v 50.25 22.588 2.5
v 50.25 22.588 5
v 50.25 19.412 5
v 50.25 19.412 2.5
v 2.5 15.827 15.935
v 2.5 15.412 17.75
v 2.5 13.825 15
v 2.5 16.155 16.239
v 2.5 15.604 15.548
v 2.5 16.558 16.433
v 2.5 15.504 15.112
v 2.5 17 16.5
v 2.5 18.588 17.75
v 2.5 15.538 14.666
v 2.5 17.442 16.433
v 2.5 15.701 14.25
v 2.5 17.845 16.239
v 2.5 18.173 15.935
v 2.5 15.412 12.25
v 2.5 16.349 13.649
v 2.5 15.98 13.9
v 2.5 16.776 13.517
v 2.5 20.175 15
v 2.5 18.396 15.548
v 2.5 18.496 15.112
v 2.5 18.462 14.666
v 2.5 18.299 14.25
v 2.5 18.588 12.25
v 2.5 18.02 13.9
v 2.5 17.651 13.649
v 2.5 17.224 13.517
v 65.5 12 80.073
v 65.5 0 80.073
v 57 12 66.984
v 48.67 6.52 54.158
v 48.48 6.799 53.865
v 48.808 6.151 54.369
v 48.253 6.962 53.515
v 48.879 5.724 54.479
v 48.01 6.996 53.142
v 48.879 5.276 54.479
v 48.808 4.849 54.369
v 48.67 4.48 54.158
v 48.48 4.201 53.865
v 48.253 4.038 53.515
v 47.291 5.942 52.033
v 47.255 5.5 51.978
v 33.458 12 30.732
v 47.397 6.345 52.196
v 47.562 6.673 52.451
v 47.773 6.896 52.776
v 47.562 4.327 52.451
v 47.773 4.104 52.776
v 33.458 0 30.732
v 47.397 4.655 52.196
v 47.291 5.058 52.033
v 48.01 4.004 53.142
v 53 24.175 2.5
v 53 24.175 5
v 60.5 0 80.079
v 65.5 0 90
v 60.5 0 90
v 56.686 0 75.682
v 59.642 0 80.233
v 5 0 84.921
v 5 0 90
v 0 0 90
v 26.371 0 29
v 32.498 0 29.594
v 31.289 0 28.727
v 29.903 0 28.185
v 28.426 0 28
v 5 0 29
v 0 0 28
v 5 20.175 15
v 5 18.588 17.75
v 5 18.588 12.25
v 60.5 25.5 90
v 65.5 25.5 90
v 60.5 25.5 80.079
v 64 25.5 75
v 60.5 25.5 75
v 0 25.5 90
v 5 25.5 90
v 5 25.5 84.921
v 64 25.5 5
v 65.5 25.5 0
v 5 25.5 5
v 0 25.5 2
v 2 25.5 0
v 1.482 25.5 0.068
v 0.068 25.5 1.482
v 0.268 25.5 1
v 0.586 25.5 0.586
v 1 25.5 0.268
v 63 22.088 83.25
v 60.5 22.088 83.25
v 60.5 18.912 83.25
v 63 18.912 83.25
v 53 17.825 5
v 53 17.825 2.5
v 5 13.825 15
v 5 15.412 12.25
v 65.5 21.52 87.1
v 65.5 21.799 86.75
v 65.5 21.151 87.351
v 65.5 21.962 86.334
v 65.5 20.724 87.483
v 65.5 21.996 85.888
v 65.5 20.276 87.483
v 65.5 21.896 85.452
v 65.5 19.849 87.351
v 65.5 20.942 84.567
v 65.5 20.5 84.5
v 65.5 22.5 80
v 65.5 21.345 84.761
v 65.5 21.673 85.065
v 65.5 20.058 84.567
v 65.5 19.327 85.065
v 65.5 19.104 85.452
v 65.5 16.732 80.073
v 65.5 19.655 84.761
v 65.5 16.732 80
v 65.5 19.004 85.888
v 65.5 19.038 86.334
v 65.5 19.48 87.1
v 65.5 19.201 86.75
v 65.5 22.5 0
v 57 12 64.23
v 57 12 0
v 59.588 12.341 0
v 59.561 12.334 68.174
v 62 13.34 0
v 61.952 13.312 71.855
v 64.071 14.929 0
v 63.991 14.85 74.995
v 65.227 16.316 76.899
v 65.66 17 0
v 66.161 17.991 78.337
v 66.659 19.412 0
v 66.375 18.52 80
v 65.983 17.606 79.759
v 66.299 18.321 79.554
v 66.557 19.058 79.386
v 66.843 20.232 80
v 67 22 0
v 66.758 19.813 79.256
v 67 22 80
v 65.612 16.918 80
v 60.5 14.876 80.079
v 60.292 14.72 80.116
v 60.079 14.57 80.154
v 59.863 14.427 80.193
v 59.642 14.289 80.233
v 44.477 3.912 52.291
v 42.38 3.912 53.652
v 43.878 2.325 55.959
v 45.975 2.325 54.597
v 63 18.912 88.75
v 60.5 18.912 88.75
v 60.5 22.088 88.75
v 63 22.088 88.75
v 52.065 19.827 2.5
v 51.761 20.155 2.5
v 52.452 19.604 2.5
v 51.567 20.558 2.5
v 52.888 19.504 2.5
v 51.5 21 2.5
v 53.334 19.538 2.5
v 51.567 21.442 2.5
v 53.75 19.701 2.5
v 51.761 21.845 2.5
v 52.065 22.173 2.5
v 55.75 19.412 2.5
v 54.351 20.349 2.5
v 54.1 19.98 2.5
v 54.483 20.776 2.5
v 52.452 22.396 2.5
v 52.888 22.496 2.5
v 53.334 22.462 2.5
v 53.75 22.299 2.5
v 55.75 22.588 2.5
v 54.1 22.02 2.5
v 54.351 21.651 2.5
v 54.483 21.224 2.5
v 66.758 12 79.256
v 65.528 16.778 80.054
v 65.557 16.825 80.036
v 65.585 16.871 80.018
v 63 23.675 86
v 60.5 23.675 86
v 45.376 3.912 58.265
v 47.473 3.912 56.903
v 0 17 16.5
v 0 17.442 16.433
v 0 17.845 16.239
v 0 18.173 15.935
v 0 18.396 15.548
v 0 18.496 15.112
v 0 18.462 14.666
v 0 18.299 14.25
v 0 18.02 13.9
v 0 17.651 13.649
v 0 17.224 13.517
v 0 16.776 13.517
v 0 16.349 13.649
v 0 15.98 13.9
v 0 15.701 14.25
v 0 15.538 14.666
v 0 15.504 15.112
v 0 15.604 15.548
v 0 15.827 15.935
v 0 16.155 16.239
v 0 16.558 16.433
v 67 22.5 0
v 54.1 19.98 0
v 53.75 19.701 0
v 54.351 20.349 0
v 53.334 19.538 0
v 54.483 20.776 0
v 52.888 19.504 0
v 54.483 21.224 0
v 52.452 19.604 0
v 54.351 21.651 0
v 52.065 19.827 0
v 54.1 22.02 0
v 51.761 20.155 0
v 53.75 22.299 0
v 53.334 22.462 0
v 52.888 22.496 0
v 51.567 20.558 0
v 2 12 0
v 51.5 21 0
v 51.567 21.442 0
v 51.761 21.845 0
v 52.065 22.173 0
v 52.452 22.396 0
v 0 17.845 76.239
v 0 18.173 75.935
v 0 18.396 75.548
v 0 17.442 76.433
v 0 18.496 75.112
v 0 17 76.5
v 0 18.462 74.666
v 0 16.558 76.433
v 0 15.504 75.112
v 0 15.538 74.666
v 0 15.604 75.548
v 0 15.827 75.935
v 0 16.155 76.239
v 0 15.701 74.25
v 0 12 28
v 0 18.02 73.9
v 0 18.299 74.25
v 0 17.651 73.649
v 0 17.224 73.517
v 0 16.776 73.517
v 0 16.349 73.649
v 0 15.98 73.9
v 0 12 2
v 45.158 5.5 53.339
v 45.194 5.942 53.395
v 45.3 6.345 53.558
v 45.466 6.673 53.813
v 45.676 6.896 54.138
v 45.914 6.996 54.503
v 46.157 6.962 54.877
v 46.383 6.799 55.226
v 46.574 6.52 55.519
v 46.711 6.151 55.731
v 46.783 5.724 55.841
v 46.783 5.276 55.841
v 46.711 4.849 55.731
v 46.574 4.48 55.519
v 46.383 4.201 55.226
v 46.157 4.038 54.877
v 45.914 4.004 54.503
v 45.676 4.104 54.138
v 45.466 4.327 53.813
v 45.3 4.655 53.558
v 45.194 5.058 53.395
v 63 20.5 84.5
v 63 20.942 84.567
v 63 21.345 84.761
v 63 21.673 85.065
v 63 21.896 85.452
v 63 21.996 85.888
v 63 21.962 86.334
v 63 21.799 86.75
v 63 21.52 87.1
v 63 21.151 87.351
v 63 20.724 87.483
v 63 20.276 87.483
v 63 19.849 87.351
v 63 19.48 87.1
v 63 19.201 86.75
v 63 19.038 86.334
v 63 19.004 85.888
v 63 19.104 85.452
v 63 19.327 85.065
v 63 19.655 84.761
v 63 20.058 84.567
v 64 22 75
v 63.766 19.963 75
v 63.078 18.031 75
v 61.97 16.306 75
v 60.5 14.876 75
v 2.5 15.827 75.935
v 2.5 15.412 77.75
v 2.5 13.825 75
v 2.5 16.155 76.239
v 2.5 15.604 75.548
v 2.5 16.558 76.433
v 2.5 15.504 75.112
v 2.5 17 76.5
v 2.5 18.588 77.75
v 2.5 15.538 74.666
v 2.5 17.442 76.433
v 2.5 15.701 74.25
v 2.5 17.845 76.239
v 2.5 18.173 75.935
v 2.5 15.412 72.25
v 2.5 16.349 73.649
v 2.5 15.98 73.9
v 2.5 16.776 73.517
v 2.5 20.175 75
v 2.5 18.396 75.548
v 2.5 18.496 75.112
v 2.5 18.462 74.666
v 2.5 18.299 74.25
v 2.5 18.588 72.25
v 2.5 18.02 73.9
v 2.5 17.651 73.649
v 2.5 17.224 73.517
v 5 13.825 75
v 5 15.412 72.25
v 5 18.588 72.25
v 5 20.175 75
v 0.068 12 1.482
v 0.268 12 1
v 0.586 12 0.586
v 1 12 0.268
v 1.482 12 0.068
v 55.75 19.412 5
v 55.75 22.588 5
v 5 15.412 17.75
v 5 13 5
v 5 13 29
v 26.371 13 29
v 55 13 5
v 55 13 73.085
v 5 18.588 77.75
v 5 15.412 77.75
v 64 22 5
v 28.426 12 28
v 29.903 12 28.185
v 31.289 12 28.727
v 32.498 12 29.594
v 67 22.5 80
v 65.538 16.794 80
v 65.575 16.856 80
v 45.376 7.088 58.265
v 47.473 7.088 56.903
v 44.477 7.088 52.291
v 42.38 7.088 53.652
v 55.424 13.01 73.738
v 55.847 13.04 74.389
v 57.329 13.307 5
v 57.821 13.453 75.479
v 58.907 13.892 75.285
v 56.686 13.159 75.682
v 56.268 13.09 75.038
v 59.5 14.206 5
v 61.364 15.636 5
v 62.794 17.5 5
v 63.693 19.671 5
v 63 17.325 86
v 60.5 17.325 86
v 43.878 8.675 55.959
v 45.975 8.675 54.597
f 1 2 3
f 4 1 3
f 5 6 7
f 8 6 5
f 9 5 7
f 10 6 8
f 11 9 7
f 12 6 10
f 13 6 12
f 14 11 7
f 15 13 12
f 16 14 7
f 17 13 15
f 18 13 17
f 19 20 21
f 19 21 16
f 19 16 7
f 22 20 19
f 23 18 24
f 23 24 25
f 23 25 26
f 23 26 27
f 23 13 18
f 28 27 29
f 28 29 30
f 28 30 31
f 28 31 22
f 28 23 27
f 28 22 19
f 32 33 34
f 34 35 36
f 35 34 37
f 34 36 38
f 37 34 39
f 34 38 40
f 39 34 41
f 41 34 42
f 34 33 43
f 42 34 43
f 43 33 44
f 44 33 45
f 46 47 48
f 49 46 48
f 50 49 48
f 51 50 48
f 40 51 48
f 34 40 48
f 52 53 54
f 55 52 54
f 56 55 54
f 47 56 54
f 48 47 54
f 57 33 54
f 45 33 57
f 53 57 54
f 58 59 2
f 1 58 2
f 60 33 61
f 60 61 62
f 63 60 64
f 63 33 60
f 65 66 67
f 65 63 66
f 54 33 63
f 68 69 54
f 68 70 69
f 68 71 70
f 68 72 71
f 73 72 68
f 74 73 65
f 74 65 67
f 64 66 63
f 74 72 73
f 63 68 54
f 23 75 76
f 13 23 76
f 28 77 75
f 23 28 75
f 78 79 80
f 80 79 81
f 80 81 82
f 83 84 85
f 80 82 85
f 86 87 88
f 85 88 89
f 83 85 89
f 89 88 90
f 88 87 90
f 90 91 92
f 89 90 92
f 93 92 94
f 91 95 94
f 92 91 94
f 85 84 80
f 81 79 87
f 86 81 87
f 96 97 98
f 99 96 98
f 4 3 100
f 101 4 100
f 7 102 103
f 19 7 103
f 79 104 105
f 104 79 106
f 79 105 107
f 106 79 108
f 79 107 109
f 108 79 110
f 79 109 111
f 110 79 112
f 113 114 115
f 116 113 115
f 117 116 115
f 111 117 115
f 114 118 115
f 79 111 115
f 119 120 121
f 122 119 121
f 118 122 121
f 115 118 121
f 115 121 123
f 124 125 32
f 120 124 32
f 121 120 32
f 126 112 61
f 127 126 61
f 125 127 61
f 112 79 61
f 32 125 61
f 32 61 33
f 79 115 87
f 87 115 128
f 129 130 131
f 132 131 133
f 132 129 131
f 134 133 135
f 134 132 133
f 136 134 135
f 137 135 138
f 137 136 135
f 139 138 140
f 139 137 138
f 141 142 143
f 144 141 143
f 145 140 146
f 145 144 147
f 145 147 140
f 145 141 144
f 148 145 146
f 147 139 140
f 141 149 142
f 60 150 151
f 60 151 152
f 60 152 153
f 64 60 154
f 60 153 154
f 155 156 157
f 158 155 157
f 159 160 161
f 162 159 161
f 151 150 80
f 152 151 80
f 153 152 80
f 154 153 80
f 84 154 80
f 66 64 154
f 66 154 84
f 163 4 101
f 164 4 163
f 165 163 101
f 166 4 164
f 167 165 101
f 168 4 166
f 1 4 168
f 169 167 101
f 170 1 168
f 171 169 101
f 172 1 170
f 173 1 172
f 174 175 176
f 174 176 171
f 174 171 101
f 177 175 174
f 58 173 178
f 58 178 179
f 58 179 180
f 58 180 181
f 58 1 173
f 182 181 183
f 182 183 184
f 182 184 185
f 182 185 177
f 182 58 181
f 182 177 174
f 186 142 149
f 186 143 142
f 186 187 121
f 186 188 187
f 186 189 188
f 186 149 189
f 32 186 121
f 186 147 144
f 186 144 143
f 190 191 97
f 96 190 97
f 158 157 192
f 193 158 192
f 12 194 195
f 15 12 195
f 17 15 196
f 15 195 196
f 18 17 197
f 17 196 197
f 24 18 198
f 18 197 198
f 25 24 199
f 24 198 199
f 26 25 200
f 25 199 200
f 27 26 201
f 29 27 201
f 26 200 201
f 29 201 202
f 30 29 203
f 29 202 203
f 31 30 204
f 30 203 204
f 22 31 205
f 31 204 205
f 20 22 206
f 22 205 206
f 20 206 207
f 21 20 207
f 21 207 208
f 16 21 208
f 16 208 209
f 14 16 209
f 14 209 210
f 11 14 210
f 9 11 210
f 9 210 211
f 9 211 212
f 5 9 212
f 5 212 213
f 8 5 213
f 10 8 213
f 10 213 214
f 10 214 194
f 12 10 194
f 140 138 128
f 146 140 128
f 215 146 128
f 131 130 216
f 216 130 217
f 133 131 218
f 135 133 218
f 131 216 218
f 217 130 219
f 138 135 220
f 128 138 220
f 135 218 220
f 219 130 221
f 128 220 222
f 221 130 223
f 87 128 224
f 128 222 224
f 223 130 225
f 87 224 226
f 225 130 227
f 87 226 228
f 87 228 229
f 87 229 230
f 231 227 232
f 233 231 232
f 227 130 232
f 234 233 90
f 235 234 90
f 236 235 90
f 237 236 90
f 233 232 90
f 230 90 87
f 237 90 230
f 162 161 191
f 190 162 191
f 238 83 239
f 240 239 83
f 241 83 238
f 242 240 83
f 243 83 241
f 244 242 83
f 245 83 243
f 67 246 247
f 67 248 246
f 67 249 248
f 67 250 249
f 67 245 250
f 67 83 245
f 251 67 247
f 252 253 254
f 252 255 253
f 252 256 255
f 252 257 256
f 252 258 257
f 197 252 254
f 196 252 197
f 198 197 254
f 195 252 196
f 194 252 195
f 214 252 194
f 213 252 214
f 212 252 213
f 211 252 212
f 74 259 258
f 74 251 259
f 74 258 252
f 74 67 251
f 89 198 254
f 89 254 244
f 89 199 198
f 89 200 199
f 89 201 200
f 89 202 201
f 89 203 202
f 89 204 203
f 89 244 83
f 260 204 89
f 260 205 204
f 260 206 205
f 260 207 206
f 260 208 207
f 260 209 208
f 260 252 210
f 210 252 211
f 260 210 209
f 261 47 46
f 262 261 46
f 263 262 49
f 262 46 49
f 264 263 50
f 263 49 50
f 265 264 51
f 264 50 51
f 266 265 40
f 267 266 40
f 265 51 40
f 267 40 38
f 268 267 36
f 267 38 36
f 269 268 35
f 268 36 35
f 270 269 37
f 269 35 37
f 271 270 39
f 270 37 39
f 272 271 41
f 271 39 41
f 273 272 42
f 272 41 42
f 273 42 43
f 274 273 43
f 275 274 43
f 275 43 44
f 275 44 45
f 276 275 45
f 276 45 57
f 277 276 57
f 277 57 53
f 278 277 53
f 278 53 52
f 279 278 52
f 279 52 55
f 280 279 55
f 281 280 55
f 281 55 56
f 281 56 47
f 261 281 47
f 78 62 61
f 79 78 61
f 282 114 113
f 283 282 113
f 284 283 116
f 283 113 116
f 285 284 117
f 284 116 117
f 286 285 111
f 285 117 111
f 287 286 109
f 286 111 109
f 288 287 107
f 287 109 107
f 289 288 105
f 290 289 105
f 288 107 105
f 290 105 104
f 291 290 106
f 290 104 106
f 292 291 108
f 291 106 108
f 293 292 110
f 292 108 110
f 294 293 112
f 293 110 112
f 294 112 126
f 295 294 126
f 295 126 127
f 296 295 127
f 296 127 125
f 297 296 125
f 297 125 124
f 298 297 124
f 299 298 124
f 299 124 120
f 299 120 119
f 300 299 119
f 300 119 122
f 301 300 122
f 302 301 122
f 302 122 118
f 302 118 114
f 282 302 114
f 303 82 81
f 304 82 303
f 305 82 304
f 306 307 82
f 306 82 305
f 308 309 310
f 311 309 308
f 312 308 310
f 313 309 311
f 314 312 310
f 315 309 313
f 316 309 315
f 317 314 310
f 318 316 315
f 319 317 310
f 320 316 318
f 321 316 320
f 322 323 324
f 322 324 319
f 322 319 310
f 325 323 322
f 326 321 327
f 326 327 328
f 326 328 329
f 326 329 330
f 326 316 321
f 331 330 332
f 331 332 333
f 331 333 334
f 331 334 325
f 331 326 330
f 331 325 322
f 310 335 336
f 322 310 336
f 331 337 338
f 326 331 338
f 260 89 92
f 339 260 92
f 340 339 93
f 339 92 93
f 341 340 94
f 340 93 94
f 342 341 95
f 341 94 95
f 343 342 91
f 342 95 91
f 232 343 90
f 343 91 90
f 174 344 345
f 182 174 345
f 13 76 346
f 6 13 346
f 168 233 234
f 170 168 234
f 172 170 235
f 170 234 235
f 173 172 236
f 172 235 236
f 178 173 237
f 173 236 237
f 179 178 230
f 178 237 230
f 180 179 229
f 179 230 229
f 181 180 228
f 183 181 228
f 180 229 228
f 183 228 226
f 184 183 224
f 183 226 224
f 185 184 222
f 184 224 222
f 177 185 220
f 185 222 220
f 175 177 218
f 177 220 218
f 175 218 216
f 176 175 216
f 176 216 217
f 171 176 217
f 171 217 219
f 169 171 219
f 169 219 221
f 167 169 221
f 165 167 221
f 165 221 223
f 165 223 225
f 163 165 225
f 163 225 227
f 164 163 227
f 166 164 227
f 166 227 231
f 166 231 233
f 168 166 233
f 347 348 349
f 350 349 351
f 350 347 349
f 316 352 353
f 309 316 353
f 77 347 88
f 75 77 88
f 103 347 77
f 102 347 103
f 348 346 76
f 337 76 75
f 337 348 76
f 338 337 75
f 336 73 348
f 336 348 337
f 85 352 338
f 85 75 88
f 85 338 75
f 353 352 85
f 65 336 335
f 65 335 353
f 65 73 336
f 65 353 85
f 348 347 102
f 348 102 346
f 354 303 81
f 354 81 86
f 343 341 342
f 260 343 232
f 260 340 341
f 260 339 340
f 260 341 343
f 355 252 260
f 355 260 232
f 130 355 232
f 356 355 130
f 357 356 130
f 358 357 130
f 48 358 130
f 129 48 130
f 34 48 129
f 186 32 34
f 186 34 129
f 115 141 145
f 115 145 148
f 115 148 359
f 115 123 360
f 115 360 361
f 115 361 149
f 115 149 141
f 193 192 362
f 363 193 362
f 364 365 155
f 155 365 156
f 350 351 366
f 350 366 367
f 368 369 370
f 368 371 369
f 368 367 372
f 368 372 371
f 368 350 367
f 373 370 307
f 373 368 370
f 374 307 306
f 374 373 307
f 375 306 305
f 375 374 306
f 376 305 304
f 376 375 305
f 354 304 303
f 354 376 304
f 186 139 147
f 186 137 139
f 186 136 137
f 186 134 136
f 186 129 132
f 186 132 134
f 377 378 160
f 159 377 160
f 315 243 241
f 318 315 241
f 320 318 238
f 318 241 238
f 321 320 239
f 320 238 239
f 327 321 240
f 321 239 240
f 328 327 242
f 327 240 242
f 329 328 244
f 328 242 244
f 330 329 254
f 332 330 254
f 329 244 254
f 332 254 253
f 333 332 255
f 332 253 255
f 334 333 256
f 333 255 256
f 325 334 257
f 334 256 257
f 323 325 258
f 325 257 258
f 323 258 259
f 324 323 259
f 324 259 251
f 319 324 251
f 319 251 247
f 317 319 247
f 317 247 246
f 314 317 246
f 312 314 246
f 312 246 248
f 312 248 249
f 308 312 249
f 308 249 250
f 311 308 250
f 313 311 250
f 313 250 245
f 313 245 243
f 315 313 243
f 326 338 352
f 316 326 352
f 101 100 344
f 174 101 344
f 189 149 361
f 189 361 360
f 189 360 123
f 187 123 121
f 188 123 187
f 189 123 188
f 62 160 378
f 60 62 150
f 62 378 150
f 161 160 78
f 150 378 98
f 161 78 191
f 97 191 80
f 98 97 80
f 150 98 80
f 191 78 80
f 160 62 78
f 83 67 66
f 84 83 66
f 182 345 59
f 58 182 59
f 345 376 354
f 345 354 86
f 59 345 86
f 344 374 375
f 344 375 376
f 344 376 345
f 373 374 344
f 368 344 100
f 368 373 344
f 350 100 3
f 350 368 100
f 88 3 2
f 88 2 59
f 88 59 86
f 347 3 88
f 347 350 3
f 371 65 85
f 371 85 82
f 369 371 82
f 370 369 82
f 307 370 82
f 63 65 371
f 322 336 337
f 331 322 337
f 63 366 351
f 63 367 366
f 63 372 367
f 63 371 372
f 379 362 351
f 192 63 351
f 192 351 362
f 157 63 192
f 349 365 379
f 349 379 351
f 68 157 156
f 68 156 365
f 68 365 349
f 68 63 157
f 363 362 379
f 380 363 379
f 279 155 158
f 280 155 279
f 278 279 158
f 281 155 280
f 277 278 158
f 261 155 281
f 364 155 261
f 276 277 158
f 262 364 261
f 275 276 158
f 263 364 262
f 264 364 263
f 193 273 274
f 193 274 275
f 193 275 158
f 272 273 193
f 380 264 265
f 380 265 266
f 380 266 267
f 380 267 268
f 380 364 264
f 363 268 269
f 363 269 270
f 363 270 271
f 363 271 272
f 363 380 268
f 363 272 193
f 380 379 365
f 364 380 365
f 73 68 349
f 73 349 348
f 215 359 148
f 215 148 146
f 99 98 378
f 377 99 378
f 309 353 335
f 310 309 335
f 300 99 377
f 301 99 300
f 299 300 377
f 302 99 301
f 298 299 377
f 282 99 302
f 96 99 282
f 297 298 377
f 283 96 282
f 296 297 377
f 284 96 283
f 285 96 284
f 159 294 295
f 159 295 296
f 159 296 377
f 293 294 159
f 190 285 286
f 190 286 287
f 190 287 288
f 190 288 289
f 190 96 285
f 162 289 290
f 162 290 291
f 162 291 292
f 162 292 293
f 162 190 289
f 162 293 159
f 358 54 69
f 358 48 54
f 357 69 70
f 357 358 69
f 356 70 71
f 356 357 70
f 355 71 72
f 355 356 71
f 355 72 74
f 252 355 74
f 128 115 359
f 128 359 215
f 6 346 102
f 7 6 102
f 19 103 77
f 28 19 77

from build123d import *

# Parameters (mm, degrees)
ESQUISSE1_W              = 65.5
ESQUISSE1_H              = 90
BOSS_EXTRU_1_DEPTH       = 25.5
CONG_2_R                 = 2
ESQUISSE6_W              = 80
ESQUISSE6_H              = 22.5
BOSS_EXTRU_2_DEPTH       = 1.5
ENL_V_MAT_EXTRU_5_DEPTH  = 12
COQUE1_DEPTH             = 25.5
COQUE1_START             = 13
COQUE1_2_DEPTH           = 12.5
COQUE1_3_OUTLINE_W       = 3.5
COQUE1_3_OUTLINE_H       = 70
COQUE1_3_DEPTH           = 4.5
ENL_V_MAT_EXTRU_12_DEPTH = 12.5
CONG_5_R                 = 9
CONG_4_R                 = 10
BOSS_EXTRU_3_REACH       = 115.01
BOSS_EXTRU_3_END_RADIUS  = 10
ESQUISSE5_R              = 1.5
ENL_V_MAT_EXTRU_4_DEPTH  = 8
CONG_3_R                 = 6
ESQUISSE11_R             = 1.5
ENL_V_MAT_EXTRU_7_DEPTH  = 7.5
ESQUISSE12_R             = 1.5
ENL_V_MAT_EXTRU_8_DEPTH  = 7.5
ENL_V_MAT_EXTRU_9_DEPTH  = 2.5
ENL_V_MAT_EXTRU_10_DEPTH = 2.5
ENL_V_MAT_EXTRU_11_DEPTH = 2.5
BOSS_EXTRU_7_START       = -25.5
BOSS_EXTRU_7_DEPTH       = 25.5
ENL_V_MAT_EXTRU_13_DEPTH = 116.061939841
ESQUISSE21_R             = 1.5
ENL_V_MAT_EXTRU_14_DEPTH = 7.5
ENL_V_MAT_EXTRU_15_DEPTH = 2.5


# Read off the part's stored shape, not the designer's step: Coque1
with BuildPart() as part:
    # Esquisse1 → Boss.-Extru.1 (new body)
    with BuildSketch(Plane(origin=(0, 0, 0), x_dir=(1, 0, 0), z_dir=(0, 1, 0))):
        with Locations((32.75, -45)):
            Rectangle(ESQUISSE1_W, ESQUISSE1_H)
    extrude(amount=BOSS_EXTRU_1_DEPTH)

    # Congé2
    cong_2_edges = [part.edges().sort_by_distance(p)[0] for p in [
        (0, 12.75, 0),
    ]]
    fillet(cong_2_edges, radius=CONG_2_R)

    # Esquisse6 → Boss.-Extru.2 (add)
    with BuildSketch(Plane(origin=(65.5, 0, 0), x_dir=(0, 0, -1), z_dir=(1, 0, 0))):
        with Locations((-40, 11.25)):
            Rectangle(ESQUISSE6_W, ESQUISSE6_H)
    extrude(amount=BOSS_EXTRU_2_DEPTH)

    # Esquisse8 → Enlèv. mat.-Extru.5 (cut)
    with BuildSketch(Plane.XZ):
        Polygon((0, 0), (67, 0), (67, 82.382775564), (31.68341261, 28), (0, 28), align=None)
    extrude(amount=-ENL_V_MAT_EXTRU_5_DEPTH, mode=Mode.SUBTRACT)

    # Coque1 outline → Coque1 (cut)
    with BuildSketch(Plane(origin=(0, 0, 0), x_dir=(1, 0, 0), z_dir=(0, 1, 0))):
        Polygon((60.5, -90), (60.5, -81.554045593), (26.371003739, -29), (5, -29), (5, -90), align=None)
    extrude(amount=COQUE1_DEPTH, mode=Mode.SUBTRACT)

    # Coque1 2 outline → Coque1 2 (cut)
    with BuildSketch(Plane(origin=(0, 0, 0), x_dir=(1, 0, 0), z_dir=(0, 1, 0)).offset(COQUE1_START)):
        Polygon((60.5, -81.554045593), (60.5, -5), (5, -5), (5, -29), (26.371003739, -29), align=None)
    extrude(amount=COQUE1_2_DEPTH, mode=Mode.SUBTRACT)

    # Coque1 3 outline → Coque1 3 (cut)
    with BuildSketch(Plane(origin=(0, 0, 0), x_dir=(1, 0, 0), z_dir=(0, 1, 0)).offset(COQUE1_START)):
        with Locations((62.25, -40)):
            Rectangle(COQUE1_3_OUTLINE_W, COQUE1_3_OUTLINE_H)
    extrude(amount=COQUE1_3_DEPTH, mode=Mode.SUBTRACT)

    # Esquisse17 → Enlèv. mat.-Extru.12 (cut)
    with BuildSketch(Plane(origin=(0, 13, 0), x_dir=(1, 0, 0), z_dir=(0, 1, 0))):
        Polygon((5, -5), (5, -29), (26.371003739, -29), (60.5, -81.554045593), (60.5, -75), (64, -75), (64, -5), align=None)
    extrude(amount=ENL_V_MAT_EXTRU_12_DEPTH, mode=Mode.SUBTRACT)

    # Congé5
    cong_5_edges = [part.edges().sort_by_distance(p)[0] for p in [
        (64, 13, 40),
    ]]
    fillet(cong_5_edges, radius=CONG_5_R)

    # Congé4
    cong_4_edges = [part.edges().sort_by_distance(p)[0] for p in [
        (67, 12, 40),
    ]]
    fillet(cong_4_edges, radius=CONG_4_R)

    # Boss.-Extru.3: up to this cylinder (the profile starts outside it)
    boss_extru_3_end = Plane(origin=(57, 22, 72.615279), z_dir=(0, 0, -1)) * Cylinder(BOSS_EXTRU_3_END_RADIUS, 251.02, mode=Mode.PRIVATE)
    # Esquisse9 → Boss.-Extru.3 (add, up to the surface)
    with BuildSketch(Plane.XZ.offset(-12), mode=Mode.PRIVATE) as boss_extru_3_sk1:
        Polygon((57, 66.984125926), (57, 64.230008238), (66.758005852, 79.256019566), (65.5, 80.072978118), align=None)
    boss_extru_3_tool1 = extrude(boss_extru_3_sk1.sketch, amount=-BOSS_EXTRU_3_REACH, mode=Mode.PRIVATE) - boss_extru_3_end
    add(boss_extru_3_tool1.solids().sort_by_distance((61.571725, 12, 72.615279))[0])

    # Esquisse5 → Enlèv. mat.-Extru.4 (cut)
    with BuildSketch(Plane.ZY):
        with Locations((15, 17)):
            Circle(ESQUISSE5_R)
        with Locations((75, 17)):
            Circle(ESQUISSE5_R)
    extrude(amount=-ENL_V_MAT_EXTRU_4_DEPTH, mode=Mode.SUBTRACT)

    # Congé3
    cong_3_edges = [part.edges().sort_by_distance(p)[0] for p in [
        (31.68341261, 6, 28),
    ]]
    fillet(cong_3_edges, radius=CONG_3_R)

    # Esquisse11 → Enlèv. mat.-Extru.7 (cut)
    with BuildSketch(Plane(origin=(9.495472341, 0, -6.166431839), x_dir=(-0.5446390350150254, 0, -0.8386705679454252), z_dir=(0.8386705679454252, 0, -0.5446390350150254))):
        with Locations((-70.828706829, 5.5)):
            Circle(ESQUISSE11_R)
    extrude(amount=-ENL_V_MAT_EXTRU_7_DEPTH, mode=Mode.SUBTRACT)

    # Esquisse12 → Enlèv. mat.-Extru.8 (cut)
    with BuildSketch(Plane(origin=(65.5, 0, 0), x_dir=(0, 0, -1), z_dir=(1, 0, 0))):
        with Locations((-86, 20.5)):
            Circle(ESQUISSE12_R)
    extrude(amount=-ENL_V_MAT_EXTRU_8_DEPTH, mode=Mode.SUBTRACT)

    # Esquisse13 → Enlèv. mat.-Extru.9 (cut)
    with BuildSketch(Plane(origin=(5, 0, 0), x_dir=(0, 0, -1), z_dir=(1, 0, 0))):
        Polygon((-72.25, 18.58771324), (-75, 20.175426481), (-77.75, 18.58771324), (-77.75, 15.41228676), (-75, 13.824573519), (-72.25, 15.41228676), align=None)
        Polygon((-12.25, 18.58771324), (-15, 20.175426481), (-17.75, 18.58771324), (-17.75, 15.41228676), (-15, 13.824573519), (-12.25, 15.41228676), align=None)
    extrude(amount=-ENL_V_MAT_EXTRU_9_DEPTH, mode=Mode.SUBTRACT)

    # Esquisse14 → Enlèv. mat.-Extru.10 (cut)
    with BuildSketch(Plane.ZY.offset(-60.5)):
        Polygon((88.75, 22.08771324), (86, 23.675426481), (83.25, 22.08771324), (83.25, 18.91228676), (86, 17.324573519), (88.75, 18.91228676), align=None)
    extrude(amount=-ENL_V_MAT_EXTRU_10_DEPTH, mode=Mode.SUBTRACT)

    # Esquisse15 → Enlèv. mat.-Extru.11 (cut)
    with BuildSketch(Plane(origin=(5.302119501, 0, -3.443236664), x_dir=(0.5446390350150254, 0, 0.8386705679454252), z_dir=(-0.8386705679454252, 0, 0.5446390350150254))):
        Polygon((73.578706829, 3.91228676), (73.578706829, 7.08771324), (70.828706829, 8.675426481), (68.078706829, 7.08771324), (68.078706829, 3.91228676), (70.828706829, 2.324573519), align=None)
    extrude(amount=-ENL_V_MAT_EXTRU_11_DEPTH, mode=Mode.SUBTRACT)

    # Esquisse18 → Boss.-Extru.7 (add)
    with BuildSketch(Plane(origin=(0, 25.5, 0), x_dir=(1, 0, 0), z_dir=(0, 1, 0)).offset(BOSS_EXTRU_7_START)):
        Polygon((5, -90), (5, -84.920747226), (60.5, -75), (60.5, -80.079252774), align=None)
    extrude(amount=BOSS_EXTRU_7_DEPTH)

    # Esquisse19 → Enlèv. mat.-Extru.13 (cut, through all)
    with BuildSketch(Plane(origin=(0, 25.5, 0), x_dir=(1, 0, 0), z_dir=(0, 1, 0))):
        Polygon((60.5, -81.554045593), (60.5, -80.079252774), (59.641872403, -80.232644972), align=None)
    extrude(amount=-ENL_V_MAT_EXTRU_13_DEPTH, mode=Mode.SUBTRACT)

    # Esquisse21 → Enlèv. mat.-Extru.14 (cut)
    with BuildSketch(Plane(origin=(0, 0, 0), x_dir=(-1, 0, 0), z_dir=(0, 0, -1))):
        with Locations((-53, 21)):
            Circle(ESQUISSE21_R)
    extrude(amount=-ENL_V_MAT_EXTRU_14_DEPTH, mode=Mode.SUBTRACT)

    # Esquisse22 → Enlèv. mat.-Extru.15 (cut)
    with BuildSketch(Plane.XY.offset(5)):
        Polygon((53, 17.824573519), (55.75, 19.41228676), (55.75, 22.58771324), (53, 24.175426481), (50.25, 22.58771324), (50.25, 19.41228676), align=None)
    extrude(amount=-ENL_V_MAT_EXTRU_15_DEPTH, mode=Mode.SUBTRACT)


solid = part.part
